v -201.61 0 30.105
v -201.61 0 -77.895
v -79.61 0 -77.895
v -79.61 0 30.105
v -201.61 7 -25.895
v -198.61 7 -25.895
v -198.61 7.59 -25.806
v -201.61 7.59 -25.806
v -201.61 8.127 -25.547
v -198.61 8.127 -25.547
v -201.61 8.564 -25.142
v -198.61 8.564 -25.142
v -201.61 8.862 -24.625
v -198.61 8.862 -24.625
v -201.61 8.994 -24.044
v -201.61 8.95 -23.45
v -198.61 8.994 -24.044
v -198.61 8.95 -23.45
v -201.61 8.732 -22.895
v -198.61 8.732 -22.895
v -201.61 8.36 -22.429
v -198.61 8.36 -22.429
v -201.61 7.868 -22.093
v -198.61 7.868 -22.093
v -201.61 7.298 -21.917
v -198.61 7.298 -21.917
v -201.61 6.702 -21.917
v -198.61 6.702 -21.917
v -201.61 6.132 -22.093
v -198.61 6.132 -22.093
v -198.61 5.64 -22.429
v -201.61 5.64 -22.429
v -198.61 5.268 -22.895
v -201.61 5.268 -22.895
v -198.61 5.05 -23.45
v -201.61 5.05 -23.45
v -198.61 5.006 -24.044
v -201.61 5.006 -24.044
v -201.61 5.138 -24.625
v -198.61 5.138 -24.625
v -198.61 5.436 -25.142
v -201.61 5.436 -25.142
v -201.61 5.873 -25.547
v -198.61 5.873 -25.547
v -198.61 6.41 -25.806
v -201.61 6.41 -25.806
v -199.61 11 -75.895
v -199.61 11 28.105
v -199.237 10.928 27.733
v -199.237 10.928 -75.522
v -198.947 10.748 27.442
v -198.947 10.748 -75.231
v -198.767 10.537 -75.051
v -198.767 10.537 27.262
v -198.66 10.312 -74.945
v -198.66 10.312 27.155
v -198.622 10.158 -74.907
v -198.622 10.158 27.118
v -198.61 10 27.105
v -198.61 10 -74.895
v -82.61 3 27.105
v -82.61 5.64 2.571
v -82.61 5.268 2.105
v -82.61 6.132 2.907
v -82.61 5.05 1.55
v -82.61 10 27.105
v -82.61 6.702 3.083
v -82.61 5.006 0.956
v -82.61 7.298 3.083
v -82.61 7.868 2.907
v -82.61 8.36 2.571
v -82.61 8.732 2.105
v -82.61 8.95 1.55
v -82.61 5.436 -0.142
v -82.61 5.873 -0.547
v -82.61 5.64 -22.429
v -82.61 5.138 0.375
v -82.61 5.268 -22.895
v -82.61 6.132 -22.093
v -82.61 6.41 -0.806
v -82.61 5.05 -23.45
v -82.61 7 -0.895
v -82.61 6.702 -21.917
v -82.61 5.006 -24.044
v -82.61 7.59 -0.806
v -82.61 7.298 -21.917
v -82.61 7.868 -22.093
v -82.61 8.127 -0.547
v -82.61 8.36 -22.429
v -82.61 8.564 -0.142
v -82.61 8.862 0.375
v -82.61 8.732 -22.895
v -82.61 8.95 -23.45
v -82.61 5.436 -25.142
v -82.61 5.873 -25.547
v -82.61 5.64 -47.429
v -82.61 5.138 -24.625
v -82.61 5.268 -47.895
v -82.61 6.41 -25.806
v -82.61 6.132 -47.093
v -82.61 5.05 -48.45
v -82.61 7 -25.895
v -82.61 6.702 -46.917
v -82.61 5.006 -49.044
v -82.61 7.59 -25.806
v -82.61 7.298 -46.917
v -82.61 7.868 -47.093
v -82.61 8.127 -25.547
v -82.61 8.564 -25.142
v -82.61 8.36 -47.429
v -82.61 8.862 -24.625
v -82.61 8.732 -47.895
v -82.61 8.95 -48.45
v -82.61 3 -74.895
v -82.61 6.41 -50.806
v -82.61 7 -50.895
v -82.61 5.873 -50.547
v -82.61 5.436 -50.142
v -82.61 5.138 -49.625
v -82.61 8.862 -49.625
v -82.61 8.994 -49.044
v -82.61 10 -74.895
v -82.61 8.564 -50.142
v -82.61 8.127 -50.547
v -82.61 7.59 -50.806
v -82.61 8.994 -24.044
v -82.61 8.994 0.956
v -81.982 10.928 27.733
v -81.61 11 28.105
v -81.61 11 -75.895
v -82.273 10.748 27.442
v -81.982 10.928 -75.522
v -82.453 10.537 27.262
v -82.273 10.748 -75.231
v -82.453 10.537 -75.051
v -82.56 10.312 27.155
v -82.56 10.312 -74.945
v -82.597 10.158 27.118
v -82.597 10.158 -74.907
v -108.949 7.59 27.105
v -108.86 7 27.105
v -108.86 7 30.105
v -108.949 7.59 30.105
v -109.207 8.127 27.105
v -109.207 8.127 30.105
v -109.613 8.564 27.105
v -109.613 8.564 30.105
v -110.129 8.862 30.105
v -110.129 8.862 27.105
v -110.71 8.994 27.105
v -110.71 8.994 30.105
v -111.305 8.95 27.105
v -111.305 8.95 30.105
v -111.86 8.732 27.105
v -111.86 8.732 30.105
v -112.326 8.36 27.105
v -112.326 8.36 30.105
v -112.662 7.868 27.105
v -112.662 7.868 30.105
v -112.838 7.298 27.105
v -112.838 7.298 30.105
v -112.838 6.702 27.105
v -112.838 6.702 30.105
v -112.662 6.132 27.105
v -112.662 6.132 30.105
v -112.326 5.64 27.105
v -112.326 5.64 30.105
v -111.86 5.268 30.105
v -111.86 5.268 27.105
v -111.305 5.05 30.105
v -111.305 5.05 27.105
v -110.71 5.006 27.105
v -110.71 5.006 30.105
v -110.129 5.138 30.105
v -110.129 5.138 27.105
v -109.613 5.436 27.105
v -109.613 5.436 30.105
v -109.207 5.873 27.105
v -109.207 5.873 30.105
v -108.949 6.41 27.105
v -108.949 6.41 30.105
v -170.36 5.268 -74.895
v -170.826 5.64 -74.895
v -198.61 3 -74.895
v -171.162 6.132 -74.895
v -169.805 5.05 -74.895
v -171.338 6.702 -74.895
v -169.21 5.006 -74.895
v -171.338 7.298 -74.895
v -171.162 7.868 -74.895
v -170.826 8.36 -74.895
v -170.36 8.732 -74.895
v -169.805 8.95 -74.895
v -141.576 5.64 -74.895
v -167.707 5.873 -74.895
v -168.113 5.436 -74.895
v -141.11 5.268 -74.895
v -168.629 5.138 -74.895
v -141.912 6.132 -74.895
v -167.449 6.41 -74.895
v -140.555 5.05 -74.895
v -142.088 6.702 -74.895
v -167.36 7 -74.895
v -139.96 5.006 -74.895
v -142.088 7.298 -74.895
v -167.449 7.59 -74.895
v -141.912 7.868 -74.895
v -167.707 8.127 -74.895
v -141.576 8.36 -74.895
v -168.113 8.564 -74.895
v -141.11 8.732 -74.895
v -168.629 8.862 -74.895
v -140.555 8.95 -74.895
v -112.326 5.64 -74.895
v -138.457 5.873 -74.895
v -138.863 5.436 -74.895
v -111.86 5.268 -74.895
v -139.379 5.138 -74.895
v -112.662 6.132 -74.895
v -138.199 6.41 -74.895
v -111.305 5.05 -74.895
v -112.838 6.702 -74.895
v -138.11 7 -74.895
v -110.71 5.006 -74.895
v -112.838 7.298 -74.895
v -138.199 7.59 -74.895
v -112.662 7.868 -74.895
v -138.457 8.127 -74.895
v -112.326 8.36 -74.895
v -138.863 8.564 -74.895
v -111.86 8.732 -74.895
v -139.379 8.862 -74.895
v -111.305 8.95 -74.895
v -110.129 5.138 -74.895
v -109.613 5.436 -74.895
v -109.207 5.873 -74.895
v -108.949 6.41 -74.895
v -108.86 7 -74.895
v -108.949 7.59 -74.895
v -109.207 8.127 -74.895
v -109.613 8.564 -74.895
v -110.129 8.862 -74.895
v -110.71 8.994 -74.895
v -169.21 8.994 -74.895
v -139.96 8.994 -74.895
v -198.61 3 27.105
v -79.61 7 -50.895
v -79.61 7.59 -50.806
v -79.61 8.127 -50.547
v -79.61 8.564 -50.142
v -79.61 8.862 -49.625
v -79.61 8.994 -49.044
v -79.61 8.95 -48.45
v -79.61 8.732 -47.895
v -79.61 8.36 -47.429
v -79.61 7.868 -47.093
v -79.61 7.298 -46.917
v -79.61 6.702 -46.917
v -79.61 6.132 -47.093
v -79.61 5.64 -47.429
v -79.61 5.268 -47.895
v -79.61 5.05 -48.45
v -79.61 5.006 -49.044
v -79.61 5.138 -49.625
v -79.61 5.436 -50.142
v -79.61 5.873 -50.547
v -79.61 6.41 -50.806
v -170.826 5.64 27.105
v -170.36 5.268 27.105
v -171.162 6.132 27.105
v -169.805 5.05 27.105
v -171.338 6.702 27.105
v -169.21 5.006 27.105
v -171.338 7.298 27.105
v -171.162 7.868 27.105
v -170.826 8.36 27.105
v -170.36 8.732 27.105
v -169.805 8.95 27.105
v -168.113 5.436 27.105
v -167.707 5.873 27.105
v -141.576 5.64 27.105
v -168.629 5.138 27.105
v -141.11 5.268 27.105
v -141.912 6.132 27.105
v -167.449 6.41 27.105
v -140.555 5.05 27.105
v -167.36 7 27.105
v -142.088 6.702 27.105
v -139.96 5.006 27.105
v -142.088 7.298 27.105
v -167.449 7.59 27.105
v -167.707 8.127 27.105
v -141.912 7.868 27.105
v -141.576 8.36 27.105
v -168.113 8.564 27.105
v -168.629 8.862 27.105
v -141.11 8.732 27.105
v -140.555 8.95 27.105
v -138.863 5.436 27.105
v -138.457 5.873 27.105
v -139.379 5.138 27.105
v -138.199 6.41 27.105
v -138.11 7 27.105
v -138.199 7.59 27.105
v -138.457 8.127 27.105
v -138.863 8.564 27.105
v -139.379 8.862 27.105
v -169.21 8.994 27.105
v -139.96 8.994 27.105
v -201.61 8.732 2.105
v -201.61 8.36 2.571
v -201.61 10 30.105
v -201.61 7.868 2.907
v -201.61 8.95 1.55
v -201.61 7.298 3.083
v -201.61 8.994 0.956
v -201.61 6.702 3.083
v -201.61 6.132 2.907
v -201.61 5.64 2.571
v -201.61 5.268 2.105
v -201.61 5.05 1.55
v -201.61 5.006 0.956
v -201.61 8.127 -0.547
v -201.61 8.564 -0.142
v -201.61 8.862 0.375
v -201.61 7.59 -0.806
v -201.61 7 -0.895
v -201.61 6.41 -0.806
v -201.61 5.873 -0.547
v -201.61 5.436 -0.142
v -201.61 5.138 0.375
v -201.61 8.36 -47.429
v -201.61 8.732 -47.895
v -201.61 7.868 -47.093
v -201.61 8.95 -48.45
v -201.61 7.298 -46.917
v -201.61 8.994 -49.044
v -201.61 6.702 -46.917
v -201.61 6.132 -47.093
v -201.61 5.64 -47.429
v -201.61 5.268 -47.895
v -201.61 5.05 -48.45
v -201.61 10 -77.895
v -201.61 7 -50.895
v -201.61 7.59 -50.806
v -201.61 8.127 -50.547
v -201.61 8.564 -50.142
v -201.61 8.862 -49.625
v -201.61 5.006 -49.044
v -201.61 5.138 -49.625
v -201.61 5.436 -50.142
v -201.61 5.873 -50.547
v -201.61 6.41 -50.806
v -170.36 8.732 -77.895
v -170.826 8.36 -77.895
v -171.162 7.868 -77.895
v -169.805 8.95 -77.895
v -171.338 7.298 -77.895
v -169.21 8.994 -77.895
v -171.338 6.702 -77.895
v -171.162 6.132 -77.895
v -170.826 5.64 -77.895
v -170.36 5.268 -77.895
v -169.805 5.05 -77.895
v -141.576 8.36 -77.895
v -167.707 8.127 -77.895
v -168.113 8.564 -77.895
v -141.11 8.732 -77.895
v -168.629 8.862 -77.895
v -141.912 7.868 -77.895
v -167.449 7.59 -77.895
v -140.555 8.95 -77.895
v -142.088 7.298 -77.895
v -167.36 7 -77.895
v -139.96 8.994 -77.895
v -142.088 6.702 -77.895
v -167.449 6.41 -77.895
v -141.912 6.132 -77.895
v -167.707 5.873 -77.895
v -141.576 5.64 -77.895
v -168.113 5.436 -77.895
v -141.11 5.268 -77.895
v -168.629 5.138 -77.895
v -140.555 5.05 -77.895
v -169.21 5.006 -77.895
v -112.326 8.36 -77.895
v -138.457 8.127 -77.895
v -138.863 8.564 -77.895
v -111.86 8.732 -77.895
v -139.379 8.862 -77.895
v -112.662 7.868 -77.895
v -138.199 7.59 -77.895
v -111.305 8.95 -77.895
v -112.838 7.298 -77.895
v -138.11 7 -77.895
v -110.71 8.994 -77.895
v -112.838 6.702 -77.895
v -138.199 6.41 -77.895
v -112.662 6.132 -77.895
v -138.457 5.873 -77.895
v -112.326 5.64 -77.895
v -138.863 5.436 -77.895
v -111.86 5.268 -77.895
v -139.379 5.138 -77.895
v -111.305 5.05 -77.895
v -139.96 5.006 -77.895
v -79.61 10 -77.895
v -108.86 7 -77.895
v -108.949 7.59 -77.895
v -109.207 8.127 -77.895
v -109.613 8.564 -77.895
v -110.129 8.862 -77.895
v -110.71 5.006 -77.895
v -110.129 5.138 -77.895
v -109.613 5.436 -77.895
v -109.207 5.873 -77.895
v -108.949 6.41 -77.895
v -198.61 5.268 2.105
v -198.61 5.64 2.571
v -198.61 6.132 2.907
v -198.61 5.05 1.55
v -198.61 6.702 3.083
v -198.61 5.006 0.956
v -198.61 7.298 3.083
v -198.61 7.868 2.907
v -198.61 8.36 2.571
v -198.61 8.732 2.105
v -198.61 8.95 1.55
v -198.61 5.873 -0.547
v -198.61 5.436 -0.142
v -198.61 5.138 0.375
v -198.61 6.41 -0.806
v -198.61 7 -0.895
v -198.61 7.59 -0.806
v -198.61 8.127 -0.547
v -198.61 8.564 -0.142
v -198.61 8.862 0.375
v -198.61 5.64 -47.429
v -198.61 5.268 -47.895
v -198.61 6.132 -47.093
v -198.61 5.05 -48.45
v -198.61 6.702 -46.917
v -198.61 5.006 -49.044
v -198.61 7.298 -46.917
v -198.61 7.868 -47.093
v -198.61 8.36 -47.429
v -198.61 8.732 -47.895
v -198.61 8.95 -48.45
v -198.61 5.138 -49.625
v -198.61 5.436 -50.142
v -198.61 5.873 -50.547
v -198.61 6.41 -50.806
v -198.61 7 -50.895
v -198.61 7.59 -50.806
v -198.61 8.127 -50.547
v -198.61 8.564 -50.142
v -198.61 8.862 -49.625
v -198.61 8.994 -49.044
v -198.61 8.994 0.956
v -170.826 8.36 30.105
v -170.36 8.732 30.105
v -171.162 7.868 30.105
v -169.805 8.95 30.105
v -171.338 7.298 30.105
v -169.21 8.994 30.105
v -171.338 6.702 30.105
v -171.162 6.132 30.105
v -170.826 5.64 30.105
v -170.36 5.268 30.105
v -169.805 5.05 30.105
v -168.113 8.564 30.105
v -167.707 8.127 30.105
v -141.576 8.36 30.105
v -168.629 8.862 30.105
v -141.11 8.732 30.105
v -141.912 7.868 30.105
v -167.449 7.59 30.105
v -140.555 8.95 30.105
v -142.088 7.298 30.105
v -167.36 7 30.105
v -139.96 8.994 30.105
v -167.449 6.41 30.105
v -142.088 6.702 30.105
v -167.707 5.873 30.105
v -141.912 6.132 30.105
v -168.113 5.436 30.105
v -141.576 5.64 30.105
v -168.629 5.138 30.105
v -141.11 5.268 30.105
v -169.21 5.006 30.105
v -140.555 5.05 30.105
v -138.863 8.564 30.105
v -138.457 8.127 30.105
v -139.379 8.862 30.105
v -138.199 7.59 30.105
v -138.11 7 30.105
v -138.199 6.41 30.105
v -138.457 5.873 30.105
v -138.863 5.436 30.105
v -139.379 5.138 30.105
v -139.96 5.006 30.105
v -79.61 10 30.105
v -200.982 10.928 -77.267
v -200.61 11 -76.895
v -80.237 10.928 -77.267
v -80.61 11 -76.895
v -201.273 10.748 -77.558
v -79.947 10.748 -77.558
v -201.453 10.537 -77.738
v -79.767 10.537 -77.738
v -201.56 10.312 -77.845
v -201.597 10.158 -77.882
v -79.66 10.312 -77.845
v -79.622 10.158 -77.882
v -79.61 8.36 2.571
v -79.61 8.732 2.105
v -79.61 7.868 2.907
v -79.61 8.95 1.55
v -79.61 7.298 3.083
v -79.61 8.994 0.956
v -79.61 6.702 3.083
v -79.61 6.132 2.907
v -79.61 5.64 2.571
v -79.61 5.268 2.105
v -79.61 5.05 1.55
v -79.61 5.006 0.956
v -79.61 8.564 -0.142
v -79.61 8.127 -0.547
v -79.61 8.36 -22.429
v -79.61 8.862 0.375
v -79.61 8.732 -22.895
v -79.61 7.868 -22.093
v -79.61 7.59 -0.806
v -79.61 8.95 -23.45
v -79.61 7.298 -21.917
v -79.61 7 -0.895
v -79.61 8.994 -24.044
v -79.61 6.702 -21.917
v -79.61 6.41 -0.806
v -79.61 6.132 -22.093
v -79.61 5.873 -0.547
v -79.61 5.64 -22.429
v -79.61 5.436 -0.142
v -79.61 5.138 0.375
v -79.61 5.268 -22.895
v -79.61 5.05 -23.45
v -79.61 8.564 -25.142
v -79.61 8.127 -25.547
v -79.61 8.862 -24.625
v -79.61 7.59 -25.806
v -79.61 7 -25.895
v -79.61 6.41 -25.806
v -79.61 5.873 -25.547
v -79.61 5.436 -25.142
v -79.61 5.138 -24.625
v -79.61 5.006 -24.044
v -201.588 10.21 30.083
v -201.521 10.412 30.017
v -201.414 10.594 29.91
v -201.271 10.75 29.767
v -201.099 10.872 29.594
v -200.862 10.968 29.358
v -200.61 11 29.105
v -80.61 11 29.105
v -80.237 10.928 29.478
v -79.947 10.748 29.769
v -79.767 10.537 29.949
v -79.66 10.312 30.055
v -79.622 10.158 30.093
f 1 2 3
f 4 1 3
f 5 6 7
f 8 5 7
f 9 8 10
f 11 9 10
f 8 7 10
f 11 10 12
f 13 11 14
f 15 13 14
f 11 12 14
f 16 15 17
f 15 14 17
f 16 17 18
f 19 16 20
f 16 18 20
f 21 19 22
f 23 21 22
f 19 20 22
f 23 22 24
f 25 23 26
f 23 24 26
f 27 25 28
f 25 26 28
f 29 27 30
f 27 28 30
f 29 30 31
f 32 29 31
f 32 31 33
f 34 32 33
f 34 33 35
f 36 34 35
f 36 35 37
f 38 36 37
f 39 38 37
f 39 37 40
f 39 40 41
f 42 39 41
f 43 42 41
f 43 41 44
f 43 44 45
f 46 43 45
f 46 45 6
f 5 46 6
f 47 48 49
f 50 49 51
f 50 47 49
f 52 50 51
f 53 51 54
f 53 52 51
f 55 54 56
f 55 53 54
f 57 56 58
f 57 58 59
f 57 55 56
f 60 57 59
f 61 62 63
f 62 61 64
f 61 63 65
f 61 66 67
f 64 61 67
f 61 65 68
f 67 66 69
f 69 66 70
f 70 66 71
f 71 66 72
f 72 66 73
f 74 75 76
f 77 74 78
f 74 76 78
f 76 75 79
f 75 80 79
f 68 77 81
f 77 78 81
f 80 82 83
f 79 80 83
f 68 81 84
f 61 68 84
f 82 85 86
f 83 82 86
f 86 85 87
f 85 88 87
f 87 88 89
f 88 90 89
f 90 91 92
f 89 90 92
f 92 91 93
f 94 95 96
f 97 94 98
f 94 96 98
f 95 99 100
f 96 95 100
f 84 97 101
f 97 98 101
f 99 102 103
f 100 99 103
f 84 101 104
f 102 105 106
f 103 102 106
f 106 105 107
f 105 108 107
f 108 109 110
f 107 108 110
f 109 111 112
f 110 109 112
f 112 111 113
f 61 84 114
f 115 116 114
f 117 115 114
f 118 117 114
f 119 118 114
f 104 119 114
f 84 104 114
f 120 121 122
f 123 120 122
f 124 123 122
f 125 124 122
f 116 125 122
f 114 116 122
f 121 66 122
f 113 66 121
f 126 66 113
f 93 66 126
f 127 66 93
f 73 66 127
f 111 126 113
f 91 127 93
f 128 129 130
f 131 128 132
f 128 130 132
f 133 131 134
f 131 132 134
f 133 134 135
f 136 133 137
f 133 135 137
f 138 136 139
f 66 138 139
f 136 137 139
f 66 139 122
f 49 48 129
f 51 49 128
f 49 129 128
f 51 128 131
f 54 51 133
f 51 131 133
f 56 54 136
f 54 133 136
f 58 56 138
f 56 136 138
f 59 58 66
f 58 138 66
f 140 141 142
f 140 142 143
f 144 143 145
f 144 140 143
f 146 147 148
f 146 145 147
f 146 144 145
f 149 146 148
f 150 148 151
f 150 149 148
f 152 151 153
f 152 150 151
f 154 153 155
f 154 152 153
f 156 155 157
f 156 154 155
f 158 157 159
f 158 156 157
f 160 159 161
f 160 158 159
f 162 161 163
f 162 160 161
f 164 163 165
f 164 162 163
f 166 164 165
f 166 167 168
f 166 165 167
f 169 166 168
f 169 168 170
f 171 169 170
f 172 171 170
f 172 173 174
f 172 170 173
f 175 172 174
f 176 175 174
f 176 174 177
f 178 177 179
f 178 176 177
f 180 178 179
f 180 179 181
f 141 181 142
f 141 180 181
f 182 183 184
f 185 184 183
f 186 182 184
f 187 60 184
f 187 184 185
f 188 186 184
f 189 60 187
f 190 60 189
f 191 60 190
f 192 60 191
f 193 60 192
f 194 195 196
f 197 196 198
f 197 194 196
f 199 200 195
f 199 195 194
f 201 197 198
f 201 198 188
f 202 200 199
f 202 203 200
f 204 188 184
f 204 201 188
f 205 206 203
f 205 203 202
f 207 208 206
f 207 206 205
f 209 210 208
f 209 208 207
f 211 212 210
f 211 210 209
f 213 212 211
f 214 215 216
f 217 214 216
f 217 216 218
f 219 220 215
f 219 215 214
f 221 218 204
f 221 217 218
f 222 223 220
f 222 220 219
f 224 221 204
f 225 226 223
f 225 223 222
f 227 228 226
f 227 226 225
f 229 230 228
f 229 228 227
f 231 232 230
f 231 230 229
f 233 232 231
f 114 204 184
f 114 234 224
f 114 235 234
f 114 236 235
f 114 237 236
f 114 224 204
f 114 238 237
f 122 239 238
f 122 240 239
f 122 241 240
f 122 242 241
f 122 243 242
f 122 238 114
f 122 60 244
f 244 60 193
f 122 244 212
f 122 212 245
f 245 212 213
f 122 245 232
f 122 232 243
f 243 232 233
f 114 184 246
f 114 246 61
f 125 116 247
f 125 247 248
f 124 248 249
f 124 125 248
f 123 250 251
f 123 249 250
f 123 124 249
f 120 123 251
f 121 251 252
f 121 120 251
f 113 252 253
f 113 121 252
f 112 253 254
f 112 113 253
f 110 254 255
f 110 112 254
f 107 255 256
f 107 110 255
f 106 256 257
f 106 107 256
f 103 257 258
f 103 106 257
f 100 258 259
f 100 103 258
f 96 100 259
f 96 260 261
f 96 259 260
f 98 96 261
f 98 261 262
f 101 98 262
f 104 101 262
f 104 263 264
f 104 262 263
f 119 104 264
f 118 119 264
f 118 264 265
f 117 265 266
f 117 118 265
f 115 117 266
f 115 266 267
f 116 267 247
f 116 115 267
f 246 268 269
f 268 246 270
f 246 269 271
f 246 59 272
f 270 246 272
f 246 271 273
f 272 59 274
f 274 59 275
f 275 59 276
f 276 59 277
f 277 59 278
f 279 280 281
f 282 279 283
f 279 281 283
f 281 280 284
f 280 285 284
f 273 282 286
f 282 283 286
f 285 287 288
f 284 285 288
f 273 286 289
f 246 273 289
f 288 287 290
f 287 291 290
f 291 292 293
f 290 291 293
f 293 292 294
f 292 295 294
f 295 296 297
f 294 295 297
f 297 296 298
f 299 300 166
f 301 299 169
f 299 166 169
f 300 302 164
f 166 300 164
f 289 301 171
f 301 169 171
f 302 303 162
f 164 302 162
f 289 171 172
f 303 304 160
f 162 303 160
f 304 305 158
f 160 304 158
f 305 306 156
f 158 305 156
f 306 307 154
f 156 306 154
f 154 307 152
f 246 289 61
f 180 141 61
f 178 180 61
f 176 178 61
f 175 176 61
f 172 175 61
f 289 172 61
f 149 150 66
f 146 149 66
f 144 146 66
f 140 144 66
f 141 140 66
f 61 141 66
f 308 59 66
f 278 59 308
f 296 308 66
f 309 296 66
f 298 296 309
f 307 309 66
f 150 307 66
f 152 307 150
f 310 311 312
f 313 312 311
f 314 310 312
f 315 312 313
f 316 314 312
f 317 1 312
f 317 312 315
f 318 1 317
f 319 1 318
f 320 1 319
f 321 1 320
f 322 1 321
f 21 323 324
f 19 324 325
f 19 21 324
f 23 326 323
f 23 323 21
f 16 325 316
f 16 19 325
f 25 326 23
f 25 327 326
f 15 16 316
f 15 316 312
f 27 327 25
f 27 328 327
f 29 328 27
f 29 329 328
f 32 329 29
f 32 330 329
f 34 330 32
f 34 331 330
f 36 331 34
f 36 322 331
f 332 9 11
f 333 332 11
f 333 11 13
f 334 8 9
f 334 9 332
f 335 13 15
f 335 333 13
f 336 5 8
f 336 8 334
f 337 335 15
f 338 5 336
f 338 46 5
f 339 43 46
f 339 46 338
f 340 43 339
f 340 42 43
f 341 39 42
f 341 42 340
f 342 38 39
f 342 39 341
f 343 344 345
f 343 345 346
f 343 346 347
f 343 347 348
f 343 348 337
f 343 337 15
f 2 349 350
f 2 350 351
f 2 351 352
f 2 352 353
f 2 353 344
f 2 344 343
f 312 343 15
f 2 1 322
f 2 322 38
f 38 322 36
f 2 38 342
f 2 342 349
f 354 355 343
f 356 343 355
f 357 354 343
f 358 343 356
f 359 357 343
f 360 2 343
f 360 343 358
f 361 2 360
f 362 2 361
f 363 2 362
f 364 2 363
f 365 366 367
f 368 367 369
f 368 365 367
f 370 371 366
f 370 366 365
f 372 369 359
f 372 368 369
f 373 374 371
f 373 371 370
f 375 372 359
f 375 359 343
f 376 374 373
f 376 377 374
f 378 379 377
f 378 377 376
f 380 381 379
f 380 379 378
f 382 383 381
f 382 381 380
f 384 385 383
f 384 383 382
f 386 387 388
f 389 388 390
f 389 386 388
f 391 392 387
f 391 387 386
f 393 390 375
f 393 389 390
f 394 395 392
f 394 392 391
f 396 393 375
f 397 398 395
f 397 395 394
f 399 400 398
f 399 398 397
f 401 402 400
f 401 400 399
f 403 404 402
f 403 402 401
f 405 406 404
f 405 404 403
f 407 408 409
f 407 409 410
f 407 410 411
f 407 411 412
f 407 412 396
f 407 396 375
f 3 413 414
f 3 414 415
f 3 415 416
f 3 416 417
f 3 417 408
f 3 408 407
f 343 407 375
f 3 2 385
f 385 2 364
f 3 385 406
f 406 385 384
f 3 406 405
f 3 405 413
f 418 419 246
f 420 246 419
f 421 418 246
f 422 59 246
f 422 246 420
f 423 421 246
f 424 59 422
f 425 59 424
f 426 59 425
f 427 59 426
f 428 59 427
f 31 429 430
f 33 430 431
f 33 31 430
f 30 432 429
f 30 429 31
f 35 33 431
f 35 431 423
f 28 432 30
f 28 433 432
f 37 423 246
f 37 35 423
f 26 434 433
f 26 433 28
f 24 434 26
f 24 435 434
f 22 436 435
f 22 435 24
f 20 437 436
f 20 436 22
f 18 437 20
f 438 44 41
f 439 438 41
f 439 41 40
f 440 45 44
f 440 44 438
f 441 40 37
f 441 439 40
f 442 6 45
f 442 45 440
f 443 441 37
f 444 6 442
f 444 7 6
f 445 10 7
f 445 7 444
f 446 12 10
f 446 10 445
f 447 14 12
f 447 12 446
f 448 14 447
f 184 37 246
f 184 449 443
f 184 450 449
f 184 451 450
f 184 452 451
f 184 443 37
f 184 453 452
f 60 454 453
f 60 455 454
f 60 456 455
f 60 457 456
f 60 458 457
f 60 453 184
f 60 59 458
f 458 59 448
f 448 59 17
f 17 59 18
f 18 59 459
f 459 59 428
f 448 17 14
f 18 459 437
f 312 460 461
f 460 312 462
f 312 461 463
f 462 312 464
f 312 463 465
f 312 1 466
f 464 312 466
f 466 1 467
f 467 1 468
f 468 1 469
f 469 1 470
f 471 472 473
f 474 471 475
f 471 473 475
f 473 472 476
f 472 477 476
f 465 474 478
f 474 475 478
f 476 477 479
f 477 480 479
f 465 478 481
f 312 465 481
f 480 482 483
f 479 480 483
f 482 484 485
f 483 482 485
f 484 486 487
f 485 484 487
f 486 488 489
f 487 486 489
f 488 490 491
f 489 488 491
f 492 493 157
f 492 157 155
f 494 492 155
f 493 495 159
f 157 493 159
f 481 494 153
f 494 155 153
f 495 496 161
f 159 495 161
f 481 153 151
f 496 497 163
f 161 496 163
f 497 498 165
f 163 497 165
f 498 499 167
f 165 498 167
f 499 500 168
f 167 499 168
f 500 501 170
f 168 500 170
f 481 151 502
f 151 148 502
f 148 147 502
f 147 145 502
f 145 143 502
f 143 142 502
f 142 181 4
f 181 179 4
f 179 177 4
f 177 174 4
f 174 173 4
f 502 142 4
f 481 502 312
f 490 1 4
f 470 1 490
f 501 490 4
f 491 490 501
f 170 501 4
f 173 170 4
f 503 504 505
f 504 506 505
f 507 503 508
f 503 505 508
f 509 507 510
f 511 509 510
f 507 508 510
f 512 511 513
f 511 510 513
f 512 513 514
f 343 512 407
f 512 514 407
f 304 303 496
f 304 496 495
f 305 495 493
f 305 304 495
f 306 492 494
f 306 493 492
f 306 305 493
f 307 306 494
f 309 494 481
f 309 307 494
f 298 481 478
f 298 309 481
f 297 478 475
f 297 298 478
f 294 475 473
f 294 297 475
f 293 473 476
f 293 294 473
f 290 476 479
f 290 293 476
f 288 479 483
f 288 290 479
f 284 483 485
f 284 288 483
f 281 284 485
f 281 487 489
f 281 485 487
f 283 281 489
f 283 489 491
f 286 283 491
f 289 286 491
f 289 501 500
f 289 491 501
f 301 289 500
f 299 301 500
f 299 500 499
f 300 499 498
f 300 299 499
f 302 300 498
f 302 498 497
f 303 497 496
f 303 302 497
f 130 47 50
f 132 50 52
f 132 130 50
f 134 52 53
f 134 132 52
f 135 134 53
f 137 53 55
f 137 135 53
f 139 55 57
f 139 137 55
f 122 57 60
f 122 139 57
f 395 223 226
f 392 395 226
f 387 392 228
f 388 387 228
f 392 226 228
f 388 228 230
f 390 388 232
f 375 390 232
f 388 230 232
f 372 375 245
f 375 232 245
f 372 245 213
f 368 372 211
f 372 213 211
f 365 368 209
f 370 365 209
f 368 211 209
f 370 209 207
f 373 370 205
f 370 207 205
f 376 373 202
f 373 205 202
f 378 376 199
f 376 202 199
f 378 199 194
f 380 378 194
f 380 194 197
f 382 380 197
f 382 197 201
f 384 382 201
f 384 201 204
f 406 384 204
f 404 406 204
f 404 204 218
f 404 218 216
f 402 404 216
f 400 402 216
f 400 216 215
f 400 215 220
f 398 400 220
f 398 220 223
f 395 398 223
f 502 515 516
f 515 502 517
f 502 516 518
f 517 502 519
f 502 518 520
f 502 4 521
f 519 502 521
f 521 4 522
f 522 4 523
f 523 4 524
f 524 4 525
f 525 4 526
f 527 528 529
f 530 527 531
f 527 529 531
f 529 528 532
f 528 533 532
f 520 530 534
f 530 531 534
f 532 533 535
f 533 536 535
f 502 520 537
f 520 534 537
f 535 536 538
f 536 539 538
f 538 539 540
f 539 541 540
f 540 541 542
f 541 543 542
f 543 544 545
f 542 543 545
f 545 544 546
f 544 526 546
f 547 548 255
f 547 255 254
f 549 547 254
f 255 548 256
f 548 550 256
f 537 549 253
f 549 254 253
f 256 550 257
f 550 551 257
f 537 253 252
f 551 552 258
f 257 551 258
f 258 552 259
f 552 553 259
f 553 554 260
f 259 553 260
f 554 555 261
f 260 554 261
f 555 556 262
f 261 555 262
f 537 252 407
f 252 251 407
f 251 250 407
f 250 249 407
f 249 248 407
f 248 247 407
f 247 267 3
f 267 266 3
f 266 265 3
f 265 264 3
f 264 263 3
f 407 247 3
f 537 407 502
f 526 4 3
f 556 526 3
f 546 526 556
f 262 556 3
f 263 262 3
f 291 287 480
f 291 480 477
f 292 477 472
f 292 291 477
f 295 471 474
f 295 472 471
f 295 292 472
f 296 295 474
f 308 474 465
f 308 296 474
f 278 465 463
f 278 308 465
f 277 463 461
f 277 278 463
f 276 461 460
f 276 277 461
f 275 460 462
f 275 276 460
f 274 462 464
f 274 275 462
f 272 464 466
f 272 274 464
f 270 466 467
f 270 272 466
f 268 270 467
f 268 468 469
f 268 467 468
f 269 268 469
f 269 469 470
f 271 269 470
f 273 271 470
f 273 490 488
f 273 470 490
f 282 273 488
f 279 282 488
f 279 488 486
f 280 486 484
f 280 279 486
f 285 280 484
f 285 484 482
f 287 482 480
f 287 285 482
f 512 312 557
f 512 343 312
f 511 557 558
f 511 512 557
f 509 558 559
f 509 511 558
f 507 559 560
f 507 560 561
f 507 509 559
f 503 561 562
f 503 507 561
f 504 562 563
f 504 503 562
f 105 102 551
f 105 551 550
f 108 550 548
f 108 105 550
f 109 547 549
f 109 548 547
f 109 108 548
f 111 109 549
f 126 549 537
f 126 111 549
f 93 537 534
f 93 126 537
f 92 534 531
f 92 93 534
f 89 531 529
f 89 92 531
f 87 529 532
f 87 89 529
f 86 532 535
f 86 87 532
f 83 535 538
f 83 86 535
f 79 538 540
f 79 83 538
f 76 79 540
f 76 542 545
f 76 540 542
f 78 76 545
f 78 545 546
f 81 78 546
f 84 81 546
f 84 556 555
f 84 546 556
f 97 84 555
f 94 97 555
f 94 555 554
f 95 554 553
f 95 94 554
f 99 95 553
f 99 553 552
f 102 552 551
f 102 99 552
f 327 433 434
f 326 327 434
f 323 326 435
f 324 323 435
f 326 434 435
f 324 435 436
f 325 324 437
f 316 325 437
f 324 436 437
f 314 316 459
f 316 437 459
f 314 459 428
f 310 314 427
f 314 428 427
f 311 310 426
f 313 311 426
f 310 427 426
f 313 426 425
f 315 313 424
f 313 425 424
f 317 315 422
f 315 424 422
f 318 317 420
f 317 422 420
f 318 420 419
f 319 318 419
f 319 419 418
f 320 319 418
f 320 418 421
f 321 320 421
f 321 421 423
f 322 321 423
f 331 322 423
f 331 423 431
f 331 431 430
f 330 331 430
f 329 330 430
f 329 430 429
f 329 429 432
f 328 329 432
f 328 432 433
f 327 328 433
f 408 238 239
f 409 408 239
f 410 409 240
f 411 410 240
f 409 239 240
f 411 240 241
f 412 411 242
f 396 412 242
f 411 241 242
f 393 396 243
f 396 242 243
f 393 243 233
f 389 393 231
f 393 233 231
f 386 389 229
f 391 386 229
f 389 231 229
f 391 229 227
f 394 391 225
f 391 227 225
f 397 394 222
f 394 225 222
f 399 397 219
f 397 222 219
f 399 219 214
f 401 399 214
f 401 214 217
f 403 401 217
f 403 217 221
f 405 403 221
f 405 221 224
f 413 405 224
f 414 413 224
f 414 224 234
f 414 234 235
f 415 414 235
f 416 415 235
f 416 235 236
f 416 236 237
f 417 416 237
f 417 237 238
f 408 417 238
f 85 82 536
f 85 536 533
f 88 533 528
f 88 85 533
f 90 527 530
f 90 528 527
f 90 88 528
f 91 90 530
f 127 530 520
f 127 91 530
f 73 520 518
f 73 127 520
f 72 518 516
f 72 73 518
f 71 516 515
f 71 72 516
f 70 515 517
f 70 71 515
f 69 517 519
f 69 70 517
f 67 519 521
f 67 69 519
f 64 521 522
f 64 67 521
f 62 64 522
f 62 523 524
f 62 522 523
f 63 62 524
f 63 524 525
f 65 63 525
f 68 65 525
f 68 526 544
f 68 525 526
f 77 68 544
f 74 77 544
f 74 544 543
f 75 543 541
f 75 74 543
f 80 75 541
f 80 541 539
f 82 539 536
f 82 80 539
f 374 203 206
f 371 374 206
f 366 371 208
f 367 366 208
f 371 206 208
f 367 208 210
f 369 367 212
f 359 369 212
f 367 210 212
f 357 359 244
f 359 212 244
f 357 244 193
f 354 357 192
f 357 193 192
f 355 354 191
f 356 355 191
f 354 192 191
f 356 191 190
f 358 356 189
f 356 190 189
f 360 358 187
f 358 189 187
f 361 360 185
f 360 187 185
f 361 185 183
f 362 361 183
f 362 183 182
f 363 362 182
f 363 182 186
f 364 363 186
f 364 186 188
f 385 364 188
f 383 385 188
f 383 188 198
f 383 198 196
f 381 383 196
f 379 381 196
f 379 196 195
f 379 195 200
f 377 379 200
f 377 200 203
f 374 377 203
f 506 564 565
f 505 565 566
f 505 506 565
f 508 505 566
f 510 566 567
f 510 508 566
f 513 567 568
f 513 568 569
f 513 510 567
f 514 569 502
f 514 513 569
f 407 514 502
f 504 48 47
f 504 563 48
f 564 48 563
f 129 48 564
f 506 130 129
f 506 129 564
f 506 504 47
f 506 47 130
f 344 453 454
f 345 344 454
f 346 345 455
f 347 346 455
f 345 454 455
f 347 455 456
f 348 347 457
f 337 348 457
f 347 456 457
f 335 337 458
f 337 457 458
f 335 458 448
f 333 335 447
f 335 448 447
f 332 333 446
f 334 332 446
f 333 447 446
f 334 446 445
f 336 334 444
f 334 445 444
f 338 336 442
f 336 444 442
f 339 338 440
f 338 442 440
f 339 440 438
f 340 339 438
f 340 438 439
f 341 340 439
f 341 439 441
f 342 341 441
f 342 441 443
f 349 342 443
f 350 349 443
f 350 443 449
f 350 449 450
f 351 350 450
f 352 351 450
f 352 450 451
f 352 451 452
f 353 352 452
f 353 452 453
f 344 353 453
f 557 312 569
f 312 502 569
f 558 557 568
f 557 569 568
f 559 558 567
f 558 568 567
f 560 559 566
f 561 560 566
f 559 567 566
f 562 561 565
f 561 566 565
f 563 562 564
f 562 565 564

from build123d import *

# Parameters (mm, degrees)
SKETCH1_W               = 122
SKETCH1_H               = 108
BOSS_EXTRUDE1_DEPTH     = 11
SKETCH4_W               = 116
SKETCH4_H               = 102
CUT_EXTRUDE1_DEPTH      = 8
SKETCH6_R               = 1.999999993
SKETCH6_R_2             = 2
CUT_EXTRUDE6_DEPTH      = 120
CUT_EXTRUDE6_DEPTH_BACK = 4
SKETCH5_R               = 2
CUT_EXTRUDE5_DEPTH      = 106
CUT_EXTRUDE5_DEPTH_BACK = 4
FILLET2_R               = 1


with BuildPart() as part:
    # Sketch1 → Boss-Extrude1 (new body)
    with BuildSketch(Plane(origin=(0, 0, 0), x_dir=(1, 0, 0), z_dir=(0, 1, 0))):
        with Locations((-140.609907121, 23.894736842)):
            Rectangle(SKETCH1_W, SKETCH1_H)
    extrude(amount=BOSS_EXTRUDE1_DEPTH)

    # Sketch4 → Cut-Extrude1 (cut)
    with BuildSketch(Plane(origin=(0, 11, 0), x_dir=(1, 0, 0), z_dir=(0, 1, 0))):
        with Locations((-140.609907121, 23.894736842)):
            Rectangle(SKETCH4_W, SKETCH4_H)
    extrude(amount=-CUT_EXTRUDE1_DEPTH, mode=Mode.SUBTRACT)

    # Sketch6 → Cut-Extrude6 (cut, two sides)
    with BuildSketch(Plane(origin=(-198.609907121, 0, 0), x_dir=(0, 0, -1), z_dir=(1, 0, 0))) as cut_extrude6_sk:
        with Locations((-1.105263158, 6.999999977)):
            Circle(SKETCH6_R)
        with Locations((23.894736842, 6.999999988)):
            Circle(SKETCH6_R)
        with Locations((48.894736842, 7)):
            Circle(SKETCH6_R_2)
    extrude(amount=CUT_EXTRUDE6_DEPTH, mode=Mode.SUBTRACT)
    extrude(cut_extrude6_sk.sketch, amount=-CUT_EXTRUDE6_DEPTH_BACK, mode=Mode.SUBTRACT)

    # Sketch5 → Cut-Extrude5 (cut, two sides)
    with BuildSketch(Plane.XY.offset(-74.894736842)) as cut_extrude5_sk:
        with Locations((-169.359907121, 7)):
            Circle(SKETCH5_R)
        with Locations((-140.109907121, 7)):
            Circle(SKETCH5_R)
        with Locations((-110.859907121, 7)):
            Circle(SKETCH5_R)
    extrude(amount=CUT_EXTRUDE5_DEPTH, mode=Mode.SUBTRACT)
    extrude(cut_extrude5_sk.sketch, amount=-CUT_EXTRUDE5_DEPTH_BACK, mode=Mode.SUBTRACT)

    # Fillet2
    fillet2_edges = [part.edges().sort_by_distance(p)[0] for p in [
        (-79.609907121, 11, -23.894736842),
        (-140.609907121, 11, -77.894736842),
        (-198.609907121, 11, -23.894736842),
        (-140.609907121, 11, 27.105263158),
        (-82.609907121, 11, -23.894736842),
        (-140.609907121, 11, -74.894736842),
        (-201.609907121, 11, -23.894736842),
        (-140.609907121, 11, 30.105263158),
    ]]
    fillet(fillet2_edges, radius=FILLET2_R)


solid = part.part
